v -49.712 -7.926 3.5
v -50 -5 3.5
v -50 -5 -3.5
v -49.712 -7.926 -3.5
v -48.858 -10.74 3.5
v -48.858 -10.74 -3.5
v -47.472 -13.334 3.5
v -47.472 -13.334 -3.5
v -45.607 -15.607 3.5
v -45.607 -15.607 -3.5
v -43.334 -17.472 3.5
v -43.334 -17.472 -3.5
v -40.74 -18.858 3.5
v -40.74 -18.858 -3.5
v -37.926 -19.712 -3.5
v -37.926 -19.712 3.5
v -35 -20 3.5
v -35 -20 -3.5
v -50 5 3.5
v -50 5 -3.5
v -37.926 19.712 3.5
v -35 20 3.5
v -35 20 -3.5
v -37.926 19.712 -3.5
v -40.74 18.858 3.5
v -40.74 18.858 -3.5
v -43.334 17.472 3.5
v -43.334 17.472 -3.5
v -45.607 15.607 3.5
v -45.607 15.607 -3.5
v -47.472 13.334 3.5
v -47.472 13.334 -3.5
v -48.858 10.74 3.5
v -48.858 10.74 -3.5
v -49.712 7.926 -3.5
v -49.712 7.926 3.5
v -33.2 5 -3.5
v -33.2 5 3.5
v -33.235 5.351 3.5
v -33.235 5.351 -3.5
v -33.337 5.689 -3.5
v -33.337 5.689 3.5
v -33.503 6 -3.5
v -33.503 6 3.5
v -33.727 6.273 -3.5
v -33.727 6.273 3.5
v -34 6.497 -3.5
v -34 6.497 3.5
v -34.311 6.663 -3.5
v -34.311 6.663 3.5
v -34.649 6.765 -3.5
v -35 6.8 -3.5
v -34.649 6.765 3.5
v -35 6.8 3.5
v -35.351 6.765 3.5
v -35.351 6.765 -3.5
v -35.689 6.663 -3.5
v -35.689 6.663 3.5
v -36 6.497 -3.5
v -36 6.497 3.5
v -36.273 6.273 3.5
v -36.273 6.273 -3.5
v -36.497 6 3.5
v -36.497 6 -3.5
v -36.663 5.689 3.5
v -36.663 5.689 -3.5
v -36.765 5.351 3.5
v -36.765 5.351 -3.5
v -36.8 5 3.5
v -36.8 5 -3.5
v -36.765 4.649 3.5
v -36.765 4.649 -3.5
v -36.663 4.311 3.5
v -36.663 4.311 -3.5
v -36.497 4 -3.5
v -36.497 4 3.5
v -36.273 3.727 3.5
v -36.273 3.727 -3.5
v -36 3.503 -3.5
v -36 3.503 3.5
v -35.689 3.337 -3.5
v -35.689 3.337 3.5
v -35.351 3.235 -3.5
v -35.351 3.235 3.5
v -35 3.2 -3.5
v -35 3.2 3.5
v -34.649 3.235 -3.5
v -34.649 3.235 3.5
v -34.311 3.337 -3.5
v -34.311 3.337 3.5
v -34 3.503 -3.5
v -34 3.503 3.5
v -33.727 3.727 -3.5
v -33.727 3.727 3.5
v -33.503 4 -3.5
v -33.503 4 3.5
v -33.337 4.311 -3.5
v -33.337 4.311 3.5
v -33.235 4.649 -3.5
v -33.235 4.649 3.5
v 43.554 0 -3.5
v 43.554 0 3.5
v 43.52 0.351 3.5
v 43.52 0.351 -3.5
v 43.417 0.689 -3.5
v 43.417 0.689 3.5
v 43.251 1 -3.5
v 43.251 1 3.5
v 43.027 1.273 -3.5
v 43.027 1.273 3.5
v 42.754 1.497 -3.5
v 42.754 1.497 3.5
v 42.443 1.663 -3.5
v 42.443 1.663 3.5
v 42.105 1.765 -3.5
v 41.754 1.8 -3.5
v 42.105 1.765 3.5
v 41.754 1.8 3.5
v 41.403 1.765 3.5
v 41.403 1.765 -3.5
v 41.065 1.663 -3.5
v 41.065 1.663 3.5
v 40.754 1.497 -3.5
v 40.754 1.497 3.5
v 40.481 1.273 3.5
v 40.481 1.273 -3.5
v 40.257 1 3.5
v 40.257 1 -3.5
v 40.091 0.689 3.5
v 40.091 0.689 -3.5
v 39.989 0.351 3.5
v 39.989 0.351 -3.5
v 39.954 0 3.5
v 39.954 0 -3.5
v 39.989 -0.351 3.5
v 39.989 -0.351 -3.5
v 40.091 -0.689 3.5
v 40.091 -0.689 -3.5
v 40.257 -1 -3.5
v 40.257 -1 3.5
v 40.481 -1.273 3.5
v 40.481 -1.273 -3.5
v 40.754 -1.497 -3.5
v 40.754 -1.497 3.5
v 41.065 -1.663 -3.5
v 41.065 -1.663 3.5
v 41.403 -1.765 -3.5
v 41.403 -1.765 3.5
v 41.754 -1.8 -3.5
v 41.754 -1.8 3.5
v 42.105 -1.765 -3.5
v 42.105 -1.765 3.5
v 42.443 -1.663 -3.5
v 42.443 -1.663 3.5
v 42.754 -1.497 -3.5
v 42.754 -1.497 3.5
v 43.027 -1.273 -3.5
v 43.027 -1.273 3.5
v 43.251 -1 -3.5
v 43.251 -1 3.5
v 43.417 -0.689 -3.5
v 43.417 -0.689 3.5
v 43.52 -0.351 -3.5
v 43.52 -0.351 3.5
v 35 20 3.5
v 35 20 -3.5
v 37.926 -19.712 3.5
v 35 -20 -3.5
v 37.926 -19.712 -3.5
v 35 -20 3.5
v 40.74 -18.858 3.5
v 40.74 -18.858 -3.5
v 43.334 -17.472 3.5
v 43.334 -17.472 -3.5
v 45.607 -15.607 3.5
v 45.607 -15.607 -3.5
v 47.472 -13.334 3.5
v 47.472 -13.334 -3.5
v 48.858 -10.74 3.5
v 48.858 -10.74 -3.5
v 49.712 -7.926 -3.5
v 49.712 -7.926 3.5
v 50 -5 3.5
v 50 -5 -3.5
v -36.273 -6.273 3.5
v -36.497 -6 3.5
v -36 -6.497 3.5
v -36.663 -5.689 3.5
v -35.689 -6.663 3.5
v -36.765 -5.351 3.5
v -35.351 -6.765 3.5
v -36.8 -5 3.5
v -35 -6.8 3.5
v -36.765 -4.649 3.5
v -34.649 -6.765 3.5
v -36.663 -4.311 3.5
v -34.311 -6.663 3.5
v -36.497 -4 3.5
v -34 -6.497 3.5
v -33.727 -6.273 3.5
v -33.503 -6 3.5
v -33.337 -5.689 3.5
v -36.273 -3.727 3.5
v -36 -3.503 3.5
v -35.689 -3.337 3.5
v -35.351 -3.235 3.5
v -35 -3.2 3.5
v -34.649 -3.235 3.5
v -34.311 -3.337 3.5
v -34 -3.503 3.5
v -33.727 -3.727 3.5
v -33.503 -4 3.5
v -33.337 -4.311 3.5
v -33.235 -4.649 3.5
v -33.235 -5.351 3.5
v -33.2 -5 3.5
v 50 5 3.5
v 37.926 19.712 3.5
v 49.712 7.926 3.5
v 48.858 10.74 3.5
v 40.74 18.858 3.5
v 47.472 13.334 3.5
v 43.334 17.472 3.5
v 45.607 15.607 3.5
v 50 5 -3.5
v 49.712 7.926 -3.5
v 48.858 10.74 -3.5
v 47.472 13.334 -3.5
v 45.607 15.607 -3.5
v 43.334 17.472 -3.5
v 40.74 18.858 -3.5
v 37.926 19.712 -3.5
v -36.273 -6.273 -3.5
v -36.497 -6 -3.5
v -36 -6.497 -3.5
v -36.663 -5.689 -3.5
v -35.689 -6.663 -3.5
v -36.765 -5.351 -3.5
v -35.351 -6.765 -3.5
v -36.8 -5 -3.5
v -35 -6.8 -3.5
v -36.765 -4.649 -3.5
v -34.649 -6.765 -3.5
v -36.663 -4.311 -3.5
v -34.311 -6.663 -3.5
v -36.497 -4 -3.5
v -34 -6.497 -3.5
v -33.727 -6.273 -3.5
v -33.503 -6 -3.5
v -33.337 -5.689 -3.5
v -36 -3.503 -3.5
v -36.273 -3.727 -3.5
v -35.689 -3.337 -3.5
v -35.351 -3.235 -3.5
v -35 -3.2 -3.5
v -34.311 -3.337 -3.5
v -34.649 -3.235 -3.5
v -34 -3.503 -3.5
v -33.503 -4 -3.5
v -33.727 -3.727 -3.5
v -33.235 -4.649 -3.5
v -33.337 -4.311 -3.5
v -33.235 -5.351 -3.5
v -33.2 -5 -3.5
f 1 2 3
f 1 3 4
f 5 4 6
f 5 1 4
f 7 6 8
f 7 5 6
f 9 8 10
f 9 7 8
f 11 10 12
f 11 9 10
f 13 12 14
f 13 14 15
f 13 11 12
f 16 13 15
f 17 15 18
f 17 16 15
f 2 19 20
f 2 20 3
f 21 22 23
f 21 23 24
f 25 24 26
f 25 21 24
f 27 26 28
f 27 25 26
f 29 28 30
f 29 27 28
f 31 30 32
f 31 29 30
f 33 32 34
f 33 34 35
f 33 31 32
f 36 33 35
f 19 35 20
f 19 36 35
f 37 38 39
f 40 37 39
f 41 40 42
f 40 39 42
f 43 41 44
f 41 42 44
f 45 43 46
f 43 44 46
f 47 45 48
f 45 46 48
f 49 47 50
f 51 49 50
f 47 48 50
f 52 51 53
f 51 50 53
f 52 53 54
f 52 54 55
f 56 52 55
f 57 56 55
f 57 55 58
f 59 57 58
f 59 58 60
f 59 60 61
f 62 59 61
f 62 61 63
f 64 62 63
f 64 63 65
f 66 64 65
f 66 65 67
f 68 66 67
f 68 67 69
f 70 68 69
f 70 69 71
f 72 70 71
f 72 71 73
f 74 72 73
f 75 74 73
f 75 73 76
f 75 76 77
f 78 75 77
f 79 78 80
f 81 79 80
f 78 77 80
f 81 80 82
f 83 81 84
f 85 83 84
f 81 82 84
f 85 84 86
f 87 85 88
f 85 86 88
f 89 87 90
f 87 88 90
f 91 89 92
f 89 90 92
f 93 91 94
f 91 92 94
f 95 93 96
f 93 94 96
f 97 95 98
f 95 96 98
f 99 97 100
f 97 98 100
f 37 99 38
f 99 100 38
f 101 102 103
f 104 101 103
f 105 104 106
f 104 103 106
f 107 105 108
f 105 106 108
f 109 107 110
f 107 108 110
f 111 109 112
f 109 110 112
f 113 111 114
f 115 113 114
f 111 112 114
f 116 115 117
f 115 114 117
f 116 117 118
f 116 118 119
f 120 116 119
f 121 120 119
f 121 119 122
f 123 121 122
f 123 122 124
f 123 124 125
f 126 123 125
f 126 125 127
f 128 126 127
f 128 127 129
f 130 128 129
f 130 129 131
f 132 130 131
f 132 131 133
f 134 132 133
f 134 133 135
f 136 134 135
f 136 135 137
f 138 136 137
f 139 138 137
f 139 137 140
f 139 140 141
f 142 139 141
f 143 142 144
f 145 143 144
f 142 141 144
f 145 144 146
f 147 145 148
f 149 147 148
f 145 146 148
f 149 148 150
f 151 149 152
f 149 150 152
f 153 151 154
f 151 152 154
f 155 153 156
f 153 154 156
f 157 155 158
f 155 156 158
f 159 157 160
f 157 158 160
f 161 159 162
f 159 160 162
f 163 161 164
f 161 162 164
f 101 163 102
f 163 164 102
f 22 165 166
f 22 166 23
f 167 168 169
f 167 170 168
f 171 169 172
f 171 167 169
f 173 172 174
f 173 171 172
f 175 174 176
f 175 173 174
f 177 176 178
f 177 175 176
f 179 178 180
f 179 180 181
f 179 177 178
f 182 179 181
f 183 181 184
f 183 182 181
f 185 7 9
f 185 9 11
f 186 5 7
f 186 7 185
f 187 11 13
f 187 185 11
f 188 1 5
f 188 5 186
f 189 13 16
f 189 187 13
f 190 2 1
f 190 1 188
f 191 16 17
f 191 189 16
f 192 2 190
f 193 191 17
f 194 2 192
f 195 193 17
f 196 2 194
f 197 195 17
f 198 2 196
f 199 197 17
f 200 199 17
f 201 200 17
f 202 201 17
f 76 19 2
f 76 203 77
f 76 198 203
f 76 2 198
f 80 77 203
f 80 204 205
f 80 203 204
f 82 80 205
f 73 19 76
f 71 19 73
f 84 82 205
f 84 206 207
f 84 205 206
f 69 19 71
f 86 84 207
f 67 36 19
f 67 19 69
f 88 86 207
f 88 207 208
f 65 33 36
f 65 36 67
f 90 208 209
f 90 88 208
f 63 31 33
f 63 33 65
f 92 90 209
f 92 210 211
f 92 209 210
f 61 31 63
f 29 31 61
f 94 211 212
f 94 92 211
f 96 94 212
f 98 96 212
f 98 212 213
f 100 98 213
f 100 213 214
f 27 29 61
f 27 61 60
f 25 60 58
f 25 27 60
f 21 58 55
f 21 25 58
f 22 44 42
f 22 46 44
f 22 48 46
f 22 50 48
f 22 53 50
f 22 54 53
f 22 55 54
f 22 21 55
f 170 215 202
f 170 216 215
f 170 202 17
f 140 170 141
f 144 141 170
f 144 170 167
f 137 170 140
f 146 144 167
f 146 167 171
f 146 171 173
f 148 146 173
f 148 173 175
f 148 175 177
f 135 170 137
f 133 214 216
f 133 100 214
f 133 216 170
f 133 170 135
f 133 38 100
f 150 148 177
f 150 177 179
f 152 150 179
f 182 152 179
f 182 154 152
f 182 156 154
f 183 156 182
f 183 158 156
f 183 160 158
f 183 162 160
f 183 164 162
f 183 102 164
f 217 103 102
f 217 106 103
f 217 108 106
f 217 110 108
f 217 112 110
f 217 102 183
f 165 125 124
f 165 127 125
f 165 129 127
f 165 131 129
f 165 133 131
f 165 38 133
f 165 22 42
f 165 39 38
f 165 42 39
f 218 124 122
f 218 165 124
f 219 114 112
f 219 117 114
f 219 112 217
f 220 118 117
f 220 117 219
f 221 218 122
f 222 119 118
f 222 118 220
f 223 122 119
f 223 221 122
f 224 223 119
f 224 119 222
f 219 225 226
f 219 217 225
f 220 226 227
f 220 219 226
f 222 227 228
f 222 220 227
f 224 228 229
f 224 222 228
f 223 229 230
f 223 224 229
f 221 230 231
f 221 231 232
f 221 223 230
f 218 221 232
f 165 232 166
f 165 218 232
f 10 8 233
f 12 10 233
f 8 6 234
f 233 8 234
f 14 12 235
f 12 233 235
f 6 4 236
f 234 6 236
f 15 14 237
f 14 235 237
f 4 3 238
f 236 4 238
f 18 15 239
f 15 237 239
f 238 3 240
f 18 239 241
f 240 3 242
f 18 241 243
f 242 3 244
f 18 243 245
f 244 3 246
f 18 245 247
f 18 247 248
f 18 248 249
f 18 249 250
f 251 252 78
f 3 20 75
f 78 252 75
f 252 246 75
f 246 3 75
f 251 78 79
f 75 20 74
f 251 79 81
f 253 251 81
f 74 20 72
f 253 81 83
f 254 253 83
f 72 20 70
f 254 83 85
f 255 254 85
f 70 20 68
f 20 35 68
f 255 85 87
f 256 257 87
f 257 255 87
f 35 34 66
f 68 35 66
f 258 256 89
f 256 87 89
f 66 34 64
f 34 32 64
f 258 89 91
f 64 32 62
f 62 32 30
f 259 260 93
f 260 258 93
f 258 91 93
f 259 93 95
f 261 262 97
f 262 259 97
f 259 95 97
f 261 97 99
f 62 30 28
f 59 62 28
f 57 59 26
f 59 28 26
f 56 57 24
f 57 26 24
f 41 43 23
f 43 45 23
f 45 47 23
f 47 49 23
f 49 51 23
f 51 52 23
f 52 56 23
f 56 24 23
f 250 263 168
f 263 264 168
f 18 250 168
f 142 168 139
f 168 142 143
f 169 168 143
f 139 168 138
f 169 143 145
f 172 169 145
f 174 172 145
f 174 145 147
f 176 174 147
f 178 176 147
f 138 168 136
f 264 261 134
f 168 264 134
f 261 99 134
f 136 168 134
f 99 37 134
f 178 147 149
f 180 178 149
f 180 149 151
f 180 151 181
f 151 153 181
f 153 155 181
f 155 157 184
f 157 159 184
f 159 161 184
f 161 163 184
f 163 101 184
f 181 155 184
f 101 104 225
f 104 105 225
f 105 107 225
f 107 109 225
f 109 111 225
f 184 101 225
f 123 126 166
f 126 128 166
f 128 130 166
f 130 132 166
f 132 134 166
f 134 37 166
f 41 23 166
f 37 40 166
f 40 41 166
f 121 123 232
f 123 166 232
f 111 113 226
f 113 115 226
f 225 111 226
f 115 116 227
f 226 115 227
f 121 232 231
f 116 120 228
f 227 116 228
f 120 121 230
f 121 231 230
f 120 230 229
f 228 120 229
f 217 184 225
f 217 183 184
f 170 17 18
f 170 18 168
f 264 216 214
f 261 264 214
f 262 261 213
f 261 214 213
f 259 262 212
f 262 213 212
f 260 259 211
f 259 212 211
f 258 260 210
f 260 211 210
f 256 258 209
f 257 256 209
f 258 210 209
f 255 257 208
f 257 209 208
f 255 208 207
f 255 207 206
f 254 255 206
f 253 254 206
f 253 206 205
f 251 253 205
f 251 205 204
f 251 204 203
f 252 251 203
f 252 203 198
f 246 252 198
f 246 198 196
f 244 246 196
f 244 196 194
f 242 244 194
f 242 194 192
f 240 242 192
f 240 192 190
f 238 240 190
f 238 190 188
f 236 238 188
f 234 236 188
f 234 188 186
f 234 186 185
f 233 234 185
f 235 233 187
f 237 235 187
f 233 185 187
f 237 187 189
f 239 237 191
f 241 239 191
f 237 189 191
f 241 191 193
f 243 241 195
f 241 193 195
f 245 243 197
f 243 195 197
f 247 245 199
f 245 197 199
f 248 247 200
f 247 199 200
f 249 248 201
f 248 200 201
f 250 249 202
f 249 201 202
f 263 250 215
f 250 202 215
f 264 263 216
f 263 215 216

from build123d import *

# Parameters (mm, degrees)
F1_DEPTH = 3.5
F2_R     = 1.8
F3_DEPTH = 8
F4_R     = 1.8
F5_DEPTH = 8000


with BuildPart() as f1:
    # F0 (on Top) → F1 (new body, symmetric)
    with BuildSketch(Plane.XY):
        with BuildLine():
            ThreePointArc((50, 5), (45.606602, 15.606602), (35, 20))
            Line((35, 20), (-35, 20))
            ThreePointArc((-35, 20), (-45.606602, 15.606602), (-50, 5))
            Line((-50, 5), (-50, -5))
            ThreePointArc((-50, -5), (-45.606602, -15.606602), (-35, -20))
            Line((-35, -20), (35, -20))
            ThreePointArc((35, -20), (45.606602, -15.606602), (50, -5))
            Line((50, -5), (50, 5))
        make_face()
    extrude(amount=F1_DEPTH, both=True)

    # F2 (on face) → F3 (cut)
    with BuildSketch(Plane.XY.offset(3.5)):
        with Locations((-35, 5)):
            Circle(F2_R)
        with Locations((-35, -5)):
            Circle(F2_R)
    extrude(amount=-F3_DEPTH, mode=Mode.SUBTRACT)

    # F4 (on face) → F5 (cut)
    with BuildSketch(Plane.XY.offset(3.5)):
        with Locations((41.754141, 0)):
            Circle(F4_R)
    extrude(amount=-F5_DEPTH, mode=Mode.SUBTRACT)


solid = f1.part
